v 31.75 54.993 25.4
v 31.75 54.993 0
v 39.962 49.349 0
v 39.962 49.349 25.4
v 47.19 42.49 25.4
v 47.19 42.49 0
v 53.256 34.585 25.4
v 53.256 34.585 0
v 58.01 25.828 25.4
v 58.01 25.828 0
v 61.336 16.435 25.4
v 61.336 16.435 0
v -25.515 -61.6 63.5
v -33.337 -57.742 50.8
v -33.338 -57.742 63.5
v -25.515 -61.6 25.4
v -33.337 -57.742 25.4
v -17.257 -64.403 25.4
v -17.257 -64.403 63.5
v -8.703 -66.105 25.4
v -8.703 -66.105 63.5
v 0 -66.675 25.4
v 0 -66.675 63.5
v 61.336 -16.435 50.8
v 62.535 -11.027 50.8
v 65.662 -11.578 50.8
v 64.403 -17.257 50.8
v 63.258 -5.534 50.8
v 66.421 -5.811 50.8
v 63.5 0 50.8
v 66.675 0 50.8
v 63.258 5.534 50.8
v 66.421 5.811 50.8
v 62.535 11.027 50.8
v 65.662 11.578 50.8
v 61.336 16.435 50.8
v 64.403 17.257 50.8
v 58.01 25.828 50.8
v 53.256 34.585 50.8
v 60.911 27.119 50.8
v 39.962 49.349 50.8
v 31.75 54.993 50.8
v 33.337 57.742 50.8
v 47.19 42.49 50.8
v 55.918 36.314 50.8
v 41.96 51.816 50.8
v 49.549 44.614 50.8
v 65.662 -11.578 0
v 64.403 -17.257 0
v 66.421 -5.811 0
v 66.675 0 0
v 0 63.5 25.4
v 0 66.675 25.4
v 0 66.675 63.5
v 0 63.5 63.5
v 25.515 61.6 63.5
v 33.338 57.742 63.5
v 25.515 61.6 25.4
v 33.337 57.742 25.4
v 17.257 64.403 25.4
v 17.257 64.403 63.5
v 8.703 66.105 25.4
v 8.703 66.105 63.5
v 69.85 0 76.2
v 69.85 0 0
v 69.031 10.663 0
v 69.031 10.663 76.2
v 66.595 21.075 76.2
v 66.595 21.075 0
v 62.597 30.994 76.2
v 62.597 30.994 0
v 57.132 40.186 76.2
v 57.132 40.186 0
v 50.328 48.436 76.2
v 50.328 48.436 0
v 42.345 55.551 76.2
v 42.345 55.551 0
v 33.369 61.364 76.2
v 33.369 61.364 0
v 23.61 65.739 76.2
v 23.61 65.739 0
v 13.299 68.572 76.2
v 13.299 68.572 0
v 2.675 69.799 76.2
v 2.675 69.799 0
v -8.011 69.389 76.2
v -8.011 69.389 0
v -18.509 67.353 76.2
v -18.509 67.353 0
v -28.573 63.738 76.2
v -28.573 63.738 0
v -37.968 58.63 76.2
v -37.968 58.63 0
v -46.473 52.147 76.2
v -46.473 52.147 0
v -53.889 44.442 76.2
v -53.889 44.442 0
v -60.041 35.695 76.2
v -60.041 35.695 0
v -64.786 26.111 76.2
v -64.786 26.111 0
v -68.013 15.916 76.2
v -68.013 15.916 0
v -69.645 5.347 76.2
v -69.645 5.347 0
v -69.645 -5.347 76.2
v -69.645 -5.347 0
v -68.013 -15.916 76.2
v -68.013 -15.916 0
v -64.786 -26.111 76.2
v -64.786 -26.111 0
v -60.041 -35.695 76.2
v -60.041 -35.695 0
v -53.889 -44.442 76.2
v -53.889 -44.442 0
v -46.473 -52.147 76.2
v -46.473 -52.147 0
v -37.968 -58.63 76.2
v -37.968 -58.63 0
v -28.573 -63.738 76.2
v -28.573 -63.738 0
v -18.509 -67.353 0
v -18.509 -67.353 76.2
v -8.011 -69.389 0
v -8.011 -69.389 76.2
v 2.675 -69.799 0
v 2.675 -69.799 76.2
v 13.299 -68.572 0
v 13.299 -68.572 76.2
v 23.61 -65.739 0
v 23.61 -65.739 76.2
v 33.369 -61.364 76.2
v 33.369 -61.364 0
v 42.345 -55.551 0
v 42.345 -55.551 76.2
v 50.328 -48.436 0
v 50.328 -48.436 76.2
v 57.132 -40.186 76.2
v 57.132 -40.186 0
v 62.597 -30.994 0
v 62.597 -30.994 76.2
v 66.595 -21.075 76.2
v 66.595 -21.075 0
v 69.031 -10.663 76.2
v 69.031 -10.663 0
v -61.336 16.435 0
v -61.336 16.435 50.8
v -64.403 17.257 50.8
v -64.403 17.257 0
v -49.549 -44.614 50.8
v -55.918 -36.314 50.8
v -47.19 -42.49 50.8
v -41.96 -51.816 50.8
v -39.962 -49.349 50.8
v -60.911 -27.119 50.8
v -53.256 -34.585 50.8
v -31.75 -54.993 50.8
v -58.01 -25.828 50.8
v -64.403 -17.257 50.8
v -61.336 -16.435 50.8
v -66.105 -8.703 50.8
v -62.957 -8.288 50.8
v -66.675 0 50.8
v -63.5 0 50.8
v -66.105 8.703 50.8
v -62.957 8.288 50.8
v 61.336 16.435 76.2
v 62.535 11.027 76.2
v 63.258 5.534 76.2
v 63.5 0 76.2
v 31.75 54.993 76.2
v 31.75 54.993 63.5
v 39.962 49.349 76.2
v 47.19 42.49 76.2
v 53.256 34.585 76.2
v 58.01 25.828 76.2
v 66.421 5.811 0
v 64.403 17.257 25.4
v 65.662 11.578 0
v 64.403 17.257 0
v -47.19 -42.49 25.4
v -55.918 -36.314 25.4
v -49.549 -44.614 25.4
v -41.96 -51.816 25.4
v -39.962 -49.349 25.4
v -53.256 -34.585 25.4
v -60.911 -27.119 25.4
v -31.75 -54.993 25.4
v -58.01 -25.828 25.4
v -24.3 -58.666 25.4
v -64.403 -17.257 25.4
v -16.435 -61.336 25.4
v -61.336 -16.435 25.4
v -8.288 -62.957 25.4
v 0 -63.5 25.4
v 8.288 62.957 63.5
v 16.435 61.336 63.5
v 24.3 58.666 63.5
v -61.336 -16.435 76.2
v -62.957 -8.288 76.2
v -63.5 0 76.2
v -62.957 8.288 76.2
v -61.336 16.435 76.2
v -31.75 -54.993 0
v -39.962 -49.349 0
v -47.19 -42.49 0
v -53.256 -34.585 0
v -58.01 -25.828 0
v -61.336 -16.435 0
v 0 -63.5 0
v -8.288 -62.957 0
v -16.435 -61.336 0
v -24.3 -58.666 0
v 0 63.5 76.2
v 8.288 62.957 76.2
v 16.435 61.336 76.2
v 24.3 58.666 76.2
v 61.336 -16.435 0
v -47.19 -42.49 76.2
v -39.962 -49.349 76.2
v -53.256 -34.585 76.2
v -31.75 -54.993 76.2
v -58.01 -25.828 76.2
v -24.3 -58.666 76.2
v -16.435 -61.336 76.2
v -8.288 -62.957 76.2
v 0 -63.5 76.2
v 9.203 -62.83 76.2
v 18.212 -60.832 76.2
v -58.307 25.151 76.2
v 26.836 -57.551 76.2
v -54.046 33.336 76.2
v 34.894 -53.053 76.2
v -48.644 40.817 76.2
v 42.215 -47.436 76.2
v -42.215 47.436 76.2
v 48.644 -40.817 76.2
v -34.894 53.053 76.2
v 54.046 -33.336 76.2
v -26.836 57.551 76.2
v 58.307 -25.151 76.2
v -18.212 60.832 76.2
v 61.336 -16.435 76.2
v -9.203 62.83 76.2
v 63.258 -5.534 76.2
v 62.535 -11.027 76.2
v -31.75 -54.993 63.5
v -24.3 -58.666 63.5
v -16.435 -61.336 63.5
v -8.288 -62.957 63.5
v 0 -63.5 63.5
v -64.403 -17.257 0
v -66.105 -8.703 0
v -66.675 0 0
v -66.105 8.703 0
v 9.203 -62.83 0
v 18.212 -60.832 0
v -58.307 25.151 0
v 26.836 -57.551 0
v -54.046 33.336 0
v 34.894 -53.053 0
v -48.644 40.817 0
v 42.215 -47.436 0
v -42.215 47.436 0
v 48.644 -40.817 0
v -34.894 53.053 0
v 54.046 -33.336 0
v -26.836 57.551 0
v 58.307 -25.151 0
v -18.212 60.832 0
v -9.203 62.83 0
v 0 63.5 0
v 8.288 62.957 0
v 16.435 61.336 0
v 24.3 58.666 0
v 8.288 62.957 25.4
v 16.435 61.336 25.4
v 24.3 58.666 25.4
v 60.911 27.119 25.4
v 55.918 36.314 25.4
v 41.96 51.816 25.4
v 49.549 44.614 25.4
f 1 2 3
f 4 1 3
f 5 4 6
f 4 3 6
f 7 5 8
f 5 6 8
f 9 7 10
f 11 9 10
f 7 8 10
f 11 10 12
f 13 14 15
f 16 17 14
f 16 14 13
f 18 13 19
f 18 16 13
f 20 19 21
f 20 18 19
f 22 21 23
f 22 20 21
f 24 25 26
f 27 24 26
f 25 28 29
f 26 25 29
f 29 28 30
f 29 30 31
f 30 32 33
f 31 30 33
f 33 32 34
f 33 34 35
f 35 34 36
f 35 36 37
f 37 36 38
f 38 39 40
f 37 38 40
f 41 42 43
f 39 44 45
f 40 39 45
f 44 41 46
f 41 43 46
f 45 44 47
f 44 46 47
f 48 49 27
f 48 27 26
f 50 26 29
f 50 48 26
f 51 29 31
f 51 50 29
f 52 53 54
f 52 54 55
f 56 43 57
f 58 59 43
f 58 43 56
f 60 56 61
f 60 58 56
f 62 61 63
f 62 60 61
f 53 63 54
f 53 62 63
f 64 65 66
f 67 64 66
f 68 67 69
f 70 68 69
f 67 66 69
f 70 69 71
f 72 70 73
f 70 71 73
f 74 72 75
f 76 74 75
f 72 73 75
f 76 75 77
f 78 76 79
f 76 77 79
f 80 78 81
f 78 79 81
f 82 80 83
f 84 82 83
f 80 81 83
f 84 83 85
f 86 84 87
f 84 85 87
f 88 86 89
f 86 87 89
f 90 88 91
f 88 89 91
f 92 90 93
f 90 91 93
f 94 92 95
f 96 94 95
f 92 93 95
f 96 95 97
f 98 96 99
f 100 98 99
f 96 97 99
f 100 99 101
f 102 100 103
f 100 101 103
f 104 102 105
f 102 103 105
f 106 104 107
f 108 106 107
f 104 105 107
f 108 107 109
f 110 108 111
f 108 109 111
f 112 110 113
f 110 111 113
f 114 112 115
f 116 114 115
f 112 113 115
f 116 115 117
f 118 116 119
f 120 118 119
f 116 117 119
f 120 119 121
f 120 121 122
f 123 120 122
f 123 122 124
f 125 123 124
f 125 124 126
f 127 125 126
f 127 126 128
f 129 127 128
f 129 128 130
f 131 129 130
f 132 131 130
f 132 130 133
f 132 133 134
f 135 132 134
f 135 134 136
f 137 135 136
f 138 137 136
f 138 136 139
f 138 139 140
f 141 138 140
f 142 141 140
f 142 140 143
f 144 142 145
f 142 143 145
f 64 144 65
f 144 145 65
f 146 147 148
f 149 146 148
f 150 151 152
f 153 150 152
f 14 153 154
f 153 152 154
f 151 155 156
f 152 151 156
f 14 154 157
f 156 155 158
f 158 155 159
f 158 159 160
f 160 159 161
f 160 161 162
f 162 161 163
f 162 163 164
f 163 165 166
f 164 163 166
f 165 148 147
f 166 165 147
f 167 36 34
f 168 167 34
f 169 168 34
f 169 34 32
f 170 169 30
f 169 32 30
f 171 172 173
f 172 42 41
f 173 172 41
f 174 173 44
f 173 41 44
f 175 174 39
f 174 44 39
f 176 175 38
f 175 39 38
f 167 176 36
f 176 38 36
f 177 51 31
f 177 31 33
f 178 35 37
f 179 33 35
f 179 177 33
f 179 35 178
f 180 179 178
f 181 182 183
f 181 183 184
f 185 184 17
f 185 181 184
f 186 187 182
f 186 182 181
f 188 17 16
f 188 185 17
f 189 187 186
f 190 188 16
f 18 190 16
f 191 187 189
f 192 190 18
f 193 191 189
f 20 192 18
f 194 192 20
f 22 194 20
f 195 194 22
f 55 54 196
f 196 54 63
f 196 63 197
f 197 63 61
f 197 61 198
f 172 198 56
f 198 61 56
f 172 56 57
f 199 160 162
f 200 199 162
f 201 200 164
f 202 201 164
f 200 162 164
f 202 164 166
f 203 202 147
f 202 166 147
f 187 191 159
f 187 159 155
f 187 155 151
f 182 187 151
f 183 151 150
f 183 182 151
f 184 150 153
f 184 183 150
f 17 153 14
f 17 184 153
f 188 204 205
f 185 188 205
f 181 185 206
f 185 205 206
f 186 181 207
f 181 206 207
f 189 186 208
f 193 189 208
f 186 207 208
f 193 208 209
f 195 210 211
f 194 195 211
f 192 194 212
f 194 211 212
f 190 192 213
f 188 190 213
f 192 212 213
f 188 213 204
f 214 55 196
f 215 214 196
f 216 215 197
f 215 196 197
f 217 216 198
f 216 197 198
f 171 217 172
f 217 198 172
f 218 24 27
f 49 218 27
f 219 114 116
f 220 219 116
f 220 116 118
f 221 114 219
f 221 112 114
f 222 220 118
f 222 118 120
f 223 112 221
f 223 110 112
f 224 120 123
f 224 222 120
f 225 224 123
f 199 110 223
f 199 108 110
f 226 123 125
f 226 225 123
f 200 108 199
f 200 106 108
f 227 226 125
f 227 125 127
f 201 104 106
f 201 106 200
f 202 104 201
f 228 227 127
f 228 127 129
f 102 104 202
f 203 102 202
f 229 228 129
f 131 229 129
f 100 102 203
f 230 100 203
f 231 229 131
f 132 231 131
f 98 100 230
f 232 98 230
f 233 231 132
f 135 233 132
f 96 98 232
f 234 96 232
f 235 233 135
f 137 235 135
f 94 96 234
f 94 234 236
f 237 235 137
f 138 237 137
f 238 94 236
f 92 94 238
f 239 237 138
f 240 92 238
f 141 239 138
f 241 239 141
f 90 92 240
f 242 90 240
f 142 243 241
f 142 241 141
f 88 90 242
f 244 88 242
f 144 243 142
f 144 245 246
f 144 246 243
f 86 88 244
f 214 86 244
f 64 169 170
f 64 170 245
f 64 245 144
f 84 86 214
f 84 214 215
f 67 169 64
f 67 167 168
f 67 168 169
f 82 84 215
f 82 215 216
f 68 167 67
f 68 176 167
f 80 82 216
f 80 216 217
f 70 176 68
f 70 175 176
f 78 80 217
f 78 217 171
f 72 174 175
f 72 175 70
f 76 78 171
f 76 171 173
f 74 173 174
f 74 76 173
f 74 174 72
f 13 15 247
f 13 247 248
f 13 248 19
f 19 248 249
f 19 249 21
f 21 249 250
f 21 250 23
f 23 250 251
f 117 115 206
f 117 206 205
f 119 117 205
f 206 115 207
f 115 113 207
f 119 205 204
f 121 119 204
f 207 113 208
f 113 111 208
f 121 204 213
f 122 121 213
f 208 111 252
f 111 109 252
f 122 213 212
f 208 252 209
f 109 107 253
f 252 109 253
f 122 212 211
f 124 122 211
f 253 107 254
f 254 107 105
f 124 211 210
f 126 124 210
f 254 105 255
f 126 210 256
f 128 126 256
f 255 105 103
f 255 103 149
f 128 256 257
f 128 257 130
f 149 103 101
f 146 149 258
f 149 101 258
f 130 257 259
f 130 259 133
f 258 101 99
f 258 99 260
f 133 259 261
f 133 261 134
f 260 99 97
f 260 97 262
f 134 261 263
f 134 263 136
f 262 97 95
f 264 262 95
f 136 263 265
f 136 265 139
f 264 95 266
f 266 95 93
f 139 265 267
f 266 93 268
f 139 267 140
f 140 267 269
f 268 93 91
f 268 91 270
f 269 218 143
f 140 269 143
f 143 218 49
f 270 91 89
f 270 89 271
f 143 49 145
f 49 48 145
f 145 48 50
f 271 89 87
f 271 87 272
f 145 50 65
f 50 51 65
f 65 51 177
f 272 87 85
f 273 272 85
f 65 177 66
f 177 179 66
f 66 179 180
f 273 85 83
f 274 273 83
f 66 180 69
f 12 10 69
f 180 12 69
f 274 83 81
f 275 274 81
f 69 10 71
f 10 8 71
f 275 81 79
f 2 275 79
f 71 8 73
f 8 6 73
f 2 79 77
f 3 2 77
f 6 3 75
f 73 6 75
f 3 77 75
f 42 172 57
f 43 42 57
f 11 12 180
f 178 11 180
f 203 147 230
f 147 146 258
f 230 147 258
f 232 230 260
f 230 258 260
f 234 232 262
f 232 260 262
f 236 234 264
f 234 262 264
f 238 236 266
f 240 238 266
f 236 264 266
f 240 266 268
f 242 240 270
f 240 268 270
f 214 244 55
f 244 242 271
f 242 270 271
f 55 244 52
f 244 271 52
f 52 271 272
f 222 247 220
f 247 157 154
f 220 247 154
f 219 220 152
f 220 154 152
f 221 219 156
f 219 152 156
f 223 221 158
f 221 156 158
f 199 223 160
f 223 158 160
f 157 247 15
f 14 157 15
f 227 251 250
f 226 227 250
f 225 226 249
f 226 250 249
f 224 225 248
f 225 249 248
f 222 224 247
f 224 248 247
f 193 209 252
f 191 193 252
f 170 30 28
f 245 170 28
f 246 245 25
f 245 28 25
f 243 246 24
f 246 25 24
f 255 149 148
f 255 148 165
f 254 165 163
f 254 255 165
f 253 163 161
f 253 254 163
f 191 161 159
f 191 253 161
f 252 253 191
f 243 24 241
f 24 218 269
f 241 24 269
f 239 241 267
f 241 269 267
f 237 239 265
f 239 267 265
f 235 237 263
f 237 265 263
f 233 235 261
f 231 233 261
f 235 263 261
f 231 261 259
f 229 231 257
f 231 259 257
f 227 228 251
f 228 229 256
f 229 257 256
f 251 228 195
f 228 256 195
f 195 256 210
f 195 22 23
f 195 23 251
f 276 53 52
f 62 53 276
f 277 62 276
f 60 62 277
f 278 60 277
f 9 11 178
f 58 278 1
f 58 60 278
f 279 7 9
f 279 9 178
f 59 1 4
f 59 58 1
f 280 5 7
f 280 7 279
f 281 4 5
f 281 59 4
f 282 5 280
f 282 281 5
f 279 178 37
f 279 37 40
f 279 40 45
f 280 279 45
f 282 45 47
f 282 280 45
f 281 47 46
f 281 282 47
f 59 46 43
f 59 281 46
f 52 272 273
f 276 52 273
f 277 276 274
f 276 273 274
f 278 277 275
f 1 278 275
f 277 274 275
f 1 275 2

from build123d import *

# Parameters (mm, degrees)
F0_R     = 69.85
F1_DEPTH = 76.2
F2_DEPTH = 50.8
F3_DEPTH = 63.5
F4_DEPTH = 25.4


with BuildPart() as f1:
    # F0 (on Top) → F1 (new body)
    with BuildSketch(Plane.XY):
        Circle(F0_R)
        with BuildLine():
            ThreePointArc((33.3375, 57.7422437973), (52.8968339639, 40.5891682792), (64.4031044678, 17.2567598322))
            ThreePointArc((64.4031044678, 17.2567598322), (66.1045861321, 8.7028338663), (66.675, 0))
            ThreePointArc((66.675, 0), (66.1045861321, -8.7028338663), (64.4031044678, -17.2567598322))
            ThreePointArc((64.4031044678, -17.2567598322), (40.5891682792, -52.8968339639), (0, -66.675))
            ThreePointArc((0, -66.675), (-17.2567598322, -64.4031044678), (-33.3375, -57.7422437973))
            ThreePointArc((-33.3375, -57.7422437973), (-52.8968339639, -40.5891682792), (-64.4031044678, -17.2567598322))
            ThreePointArc((-64.4031044678, -17.2567598322), (-66.675, 0), (-64.4031044678, 17.2567598322))
            ThreePointArc((-64.4031044678, 17.2567598322), (-40.5891682792, 52.8968339639), (0, 66.675))
            ThreePointArc((0, 66.675), (17.2567598322, 64.4031044678), (33.3375, 57.7422437973))
        make_face(mode=Mode.SUBTRACT)
        with BuildLine():
            Line((-33.3375, -57.7422437973), (-31.75, -54.9926131403))
            ThreePointArc((-31.75, -54.9926131403), (-50.3779371085, -38.6563507421), (-61.3362899694, -16.435009364))
            Line((-61.3362899694, -16.435009364), (-64.4031044678, -17.2567598322))
            ThreePointArc((-64.4031044678, -17.2567598322), (-52.8968339639, -40.5891682792), (-33.3375, -57.7422437973))
        make_face()
        with BuildLine():
            ThreePointArc((-61.3362899694, 16.435009364), (-38.6563507421, 50.3779371085), (0, 63.5))
            Line((0, 63.5), (0, 66.675))
            ThreePointArc((0, 66.675), (-40.5891682792, 52.8968339639), (-64.4031044678, 17.2567598322))
            Line((-64.4031044678, 17.2567598322), (-61.3362899694, 16.435009364))
        make_face()
        with BuildLine():
            ThreePointArc((-61.3362899694, -16.435009364), (-63.5, 0), (-61.3362899694, 16.435009364))
            Line((-61.3362899694, 16.435009364), (-64.4031044678, 17.2567598322))
            ThreePointArc((-64.4031044678, 17.2567598322), (-66.675, 0), (-64.4031044678, -17.2567598322))
            Line((-64.4031044678, -17.2567598322), (-61.3362899694, -16.435009364))
        make_face()
        with BuildLine():
            ThreePointArc((61.3362899694, 16.435009364), (62.9567486972, 8.288413206), (63.5, 0))
            ThreePointArc((63.5, 0), (62.9567486972, -8.288413206), (61.3362899694, -16.435009364))
            Line((61.3362899694, -16.435009364), (64.4031044678, -17.2567598322))
            ThreePointArc((64.4031044678, -17.2567598322), (66.1045861321, -8.7028338663), (66.675, 0))
            ThreePointArc((66.675, 0), (66.1045861321, 8.7028338663), (64.4031044678, 17.2567598322))
            Line((64.4031044678, 17.2567598322), (61.3362899694, 16.435009364))
        make_face()
        with BuildLine():
            ThreePointArc((31.75, 54.9926131403), (50.3779371085, 38.6563507421), (61.3362899694, 16.435009364))
            Line((61.3362899694, 16.435009364), (64.4031044678, 17.2567598322))
            ThreePointArc((64.4031044678, 17.2567598322), (52.8968339639, 40.5891682792), (33.3375, 57.7422437973))
            Line((33.3375, 57.7422437973), (31.75, 54.9926131403))
        make_face()
        with BuildLine():
            Line((64.4031044678, -17.2567598322), (61.3362899694, -16.435009364))
            ThreePointArc((61.3362899694, -16.435009364), (38.6563507421, -50.3779371085), (0, -63.5))
            Line((0, -63.5), (0, -66.675))
            ThreePointArc((0, -66.675), (40.5891682792, -52.8968339639), (64.4031044678, -17.2567598322))
        make_face()
        with BuildLine():
            Line((0, -66.675), (0, -63.5))
            ThreePointArc((0, -63.5), (-16.435009364, -61.3362899694), (-31.75, -54.9926131403))
            Line((-31.75, -54.9926131403), (-33.3375, -57.7422437973))
            ThreePointArc((-33.3375, -57.7422437973), (-17.2567598322, -64.4031044678), (0, -66.675))
        make_face()
        with BuildLine():
            ThreePointArc((0, 63.5), (16.435009364, 61.3362899694), (31.75, 54.9926131403))
            Line((31.75, 54.9926131403), (33.3375, 57.7422437973))
            ThreePointArc((33.3375, 57.7422437973), (17.2567598322, 64.4031044678), (0, 66.675))
            Line((0, 66.675), (0, 63.5))
        make_face()
    extrude(amount=F1_DEPTH)

    # F0 (on Top) → F2 (cut)
    with BuildSketch(Plane.XY):
        with BuildLine():
            ThreePointArc((-61.3362899694, -16.435009364), (-63.5, 0), (-61.3362899694, 16.435009364))
            Line((-61.3362899694, 16.435009364), (-64.4031044678, 17.2567598322))
            ThreePointArc((-64.4031044678, 17.2567598322), (-66.675, 0), (-64.4031044678, -17.2567598322))
            Line((-64.4031044678, -17.2567598322), (-61.3362899694, -16.435009364))
        make_face()
        with BuildLine():
            ThreePointArc((61.3362899694, 16.435009364), (62.9567486972, 8.288413206), (63.5, 0))
            ThreePointArc((63.5, 0), (62.9567486972, -8.288413206), (61.3362899694, -16.435009364))
            Line((61.3362899694, -16.435009364), (64.4031044678, -17.2567598322))
            ThreePointArc((64.4031044678, -17.2567598322), (66.1045861321, -8.7028338663), (66.675, 0))
            ThreePointArc((66.675, 0), (66.1045861321, 8.7028338663), (64.4031044678, 17.2567598322))
            Line((64.4031044678, 17.2567598322), (61.3362899694, 16.435009364))
        make_face()
        with BuildLine():
            Line((-33.3375, -57.7422437973), (-31.75, -54.9926131403))
            ThreePointArc((-31.75, -54.9926131403), (-50.3779371085, -38.6563507421), (-61.3362899694, -16.435009364))
            Line((-61.3362899694, -16.435009364), (-64.4031044678, -17.2567598322))
            ThreePointArc((-64.4031044678, -17.2567598322), (-52.8968339639, -40.5891682792), (-33.3375, -57.7422437973))
        make_face()
        with BuildLine():
            ThreePointArc((31.75, 54.9926131403), (50.3779371085, 38.6563507421), (61.3362899694, 16.435009364))
            Line((61.3362899694, 16.435009364), (64.4031044678, 17.2567598322))
            ThreePointArc((64.4031044678, 17.2567598322), (52.8968339639, 40.5891682792), (33.3375, 57.7422437973))
            Line((33.3375, 57.7422437973), (31.75, 54.9926131403))
        make_face()
    extrude(amount=F2_DEPTH, mode=Mode.SUBTRACT)

    # F0 (on Top) → F3 (cut)
    with BuildSketch(Plane.XY):
        with BuildLine():
            Line((0, -66.675), (0, -63.5))
            ThreePointArc((0, -63.5), (-16.435009364, -61.3362899694), (-31.75, -54.9926131403))
            Line((-31.75, -54.9926131403), (-33.3375, -57.7422437973))
            ThreePointArc((-33.3375, -57.7422437973), (-17.2567598322, -64.4031044678), (0, -66.675))
        make_face()
        with BuildLine():
            ThreePointArc((0, 63.5), (16.435009364, 61.3362899694), (31.75, 54.9926131403))
            Line((31.75, 54.9926131403), (33.3375, 57.7422437973))
            ThreePointArc((33.3375, 57.7422437973), (17.2567598322, 64.4031044678), (0, 66.675))
            Line((0, 66.675), (0, 63.5))
        make_face()
    extrude(amount=F3_DEPTH, mode=Mode.SUBTRACT)

    # F0 (on Top) → F4 (join)
    with BuildSketch(Plane.XY):
        with BuildLine():
            Line((-33.3375, -57.7422437973), (-31.75, -54.9926131403))
            ThreePointArc((-31.75, -54.9926131403), (-50.3779371085, -38.6563507421), (-61.3362899694, -16.435009364))
            Line((-61.3362899694, -16.435009364), (-64.4031044678, -17.2567598322))
            ThreePointArc((-64.4031044678, -17.2567598322), (-52.8968339639, -40.5891682792), (-33.3375, -57.7422437973))
        make_face()
        with BuildLine():
            Line((0, -66.675), (0, -63.5))
            ThreePointArc((0, -63.5), (-16.435009364, -61.3362899694), (-31.75, -54.9926131403))
            Line((-31.75, -54.9926131403), (-33.3375, -57.7422437973))
            ThreePointArc((-33.3375, -57.7422437973), (-17.2567598322, -64.4031044678), (0, -66.675))
        make_face()
        with BuildLine():
            ThreePointArc((31.75, 54.9926131403), (50.3779371085, 38.6563507421), (61.3362899694, 16.435009364))
            Line((61.3362899694, 16.435009364), (64.4031044678, 17.2567598322))
            ThreePointArc((64.4031044678, 17.2567598322), (52.8968339639, 40.5891682792), (33.3375, 57.7422437973))
            Line((33.3375, 57.7422437973), (31.75, 54.9926131403))
        make_face()
        with BuildLine():
            ThreePointArc((0, 63.5), (16.435009364, 61.3362899694), (31.75, 54.9926131403))
            Line((31.75, 54.9926131403), (33.3375, 57.7422437973))
            ThreePointArc((33.3375, 57.7422437973), (17.2567598322, 64.4031044678), (0, 66.675))
            Line((0, 66.675), (0, 63.5))
        make_face()
    extrude(amount=F4_DEPTH)


solid = f1.part
